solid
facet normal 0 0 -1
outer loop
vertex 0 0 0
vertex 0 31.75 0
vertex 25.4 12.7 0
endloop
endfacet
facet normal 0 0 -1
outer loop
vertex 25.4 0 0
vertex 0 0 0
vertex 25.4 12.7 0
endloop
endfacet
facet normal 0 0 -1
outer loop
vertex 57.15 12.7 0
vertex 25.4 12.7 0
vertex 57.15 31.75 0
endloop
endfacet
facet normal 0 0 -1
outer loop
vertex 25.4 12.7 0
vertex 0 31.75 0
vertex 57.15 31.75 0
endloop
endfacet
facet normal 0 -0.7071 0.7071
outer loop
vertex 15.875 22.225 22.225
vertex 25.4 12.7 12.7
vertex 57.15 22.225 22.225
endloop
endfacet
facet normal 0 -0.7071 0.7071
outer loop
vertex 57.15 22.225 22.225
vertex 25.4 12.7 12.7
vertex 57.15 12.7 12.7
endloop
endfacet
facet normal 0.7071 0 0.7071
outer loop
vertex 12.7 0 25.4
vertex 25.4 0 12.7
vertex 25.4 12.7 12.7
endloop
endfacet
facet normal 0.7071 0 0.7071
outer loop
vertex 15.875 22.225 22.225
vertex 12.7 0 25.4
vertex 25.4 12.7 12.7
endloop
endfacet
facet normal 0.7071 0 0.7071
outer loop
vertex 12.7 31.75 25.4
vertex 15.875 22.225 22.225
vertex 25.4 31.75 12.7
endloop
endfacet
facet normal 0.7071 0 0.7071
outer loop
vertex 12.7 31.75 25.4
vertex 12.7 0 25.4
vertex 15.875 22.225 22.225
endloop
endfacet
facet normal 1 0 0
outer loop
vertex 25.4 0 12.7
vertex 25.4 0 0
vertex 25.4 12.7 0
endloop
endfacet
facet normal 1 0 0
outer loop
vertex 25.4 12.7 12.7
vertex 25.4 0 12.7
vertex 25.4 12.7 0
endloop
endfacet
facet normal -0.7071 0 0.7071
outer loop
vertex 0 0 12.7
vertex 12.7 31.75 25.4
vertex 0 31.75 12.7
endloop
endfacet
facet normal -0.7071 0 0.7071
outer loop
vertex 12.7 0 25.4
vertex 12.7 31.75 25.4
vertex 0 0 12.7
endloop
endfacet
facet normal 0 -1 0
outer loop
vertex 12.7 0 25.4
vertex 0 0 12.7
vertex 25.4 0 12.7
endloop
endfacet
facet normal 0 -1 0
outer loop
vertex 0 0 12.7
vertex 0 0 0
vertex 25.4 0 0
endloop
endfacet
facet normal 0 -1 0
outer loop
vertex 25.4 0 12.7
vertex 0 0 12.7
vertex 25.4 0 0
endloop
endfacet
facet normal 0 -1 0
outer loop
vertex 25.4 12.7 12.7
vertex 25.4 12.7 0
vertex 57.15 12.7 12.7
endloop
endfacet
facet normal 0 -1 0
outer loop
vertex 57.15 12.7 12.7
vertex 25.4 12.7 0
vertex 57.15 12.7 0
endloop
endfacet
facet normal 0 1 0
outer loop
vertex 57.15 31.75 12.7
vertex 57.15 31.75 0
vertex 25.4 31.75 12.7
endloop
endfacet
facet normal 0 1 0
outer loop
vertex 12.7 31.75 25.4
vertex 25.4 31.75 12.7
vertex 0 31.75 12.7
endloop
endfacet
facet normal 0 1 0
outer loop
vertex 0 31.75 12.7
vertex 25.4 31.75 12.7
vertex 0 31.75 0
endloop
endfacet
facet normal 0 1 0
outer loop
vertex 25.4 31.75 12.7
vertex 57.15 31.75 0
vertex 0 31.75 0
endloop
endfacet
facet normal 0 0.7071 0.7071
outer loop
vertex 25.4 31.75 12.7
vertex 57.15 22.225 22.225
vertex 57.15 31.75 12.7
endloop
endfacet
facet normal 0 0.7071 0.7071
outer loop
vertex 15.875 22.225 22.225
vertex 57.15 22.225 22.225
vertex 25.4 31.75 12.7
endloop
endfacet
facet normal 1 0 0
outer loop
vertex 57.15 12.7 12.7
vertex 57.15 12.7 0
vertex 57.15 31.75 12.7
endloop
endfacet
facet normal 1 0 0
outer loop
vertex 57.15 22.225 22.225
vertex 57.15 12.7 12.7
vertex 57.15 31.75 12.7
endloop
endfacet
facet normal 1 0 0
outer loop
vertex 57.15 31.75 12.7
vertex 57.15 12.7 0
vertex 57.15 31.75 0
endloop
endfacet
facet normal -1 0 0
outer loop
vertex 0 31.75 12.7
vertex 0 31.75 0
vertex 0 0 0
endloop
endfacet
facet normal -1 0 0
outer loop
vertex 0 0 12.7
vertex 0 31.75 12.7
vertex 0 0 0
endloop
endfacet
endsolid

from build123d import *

# Parameters (mm, degrees)
F1_DEPTH = 25.4
F0_W     = 31.75
F0_H     = 19.05
F2_DEPTH = 22.225
F3_SIZE  = 12.69999
F4_SIZE  = 9.52499


# Not quite as in the source:
# - a fillet or chamfer is up to 0.001 mm smaller than in the source, because OpenCascade refuses the exact size


with BuildPart() as f1:
    # F0 (on Top) → F1 (new body)
    with BuildSketch(Plane.XY):
        Polygon((0, 31.75), (0, 0), (25.4, 0), (25.4, 12.7), (25.4, 31.75), align=None)
    extrude(amount=F1_DEPTH)

    # F0 (on Top) → F2 (join)
    with BuildSketch(Plane.XY):
        Polygon((0, 31.75), (0, 0), (25.4, 0), (25.4, 12.7), (25.4, 31.75), align=None)
        with Locations((41.275, 22.225)):
            Rectangle(F0_W, F0_H)
    extrude(amount=F2_DEPTH)

    # F3 (size 12.7 in the source; OpenCascade refuses exactly that, so slightly less here)
    f3_edges = [f1.edges().sort_by_distance(p)[0] for p in [
        (25.4, 15.875, 25.4),
        (0, 15.875, 25.4),
    ]]
    chamfer(f3_edges, length=F3_SIZE)

    # F4 (size 9.525 in the source; OpenCascade refuses exactly that, so slightly less here)
    f4_edges = [f1.edges().sort_by_distance(p)[0] for p in [
        (36.512505, 12.7, 22.225),
        (36.512505, 31.75, 22.225),
    ]]
    chamfer(f4_edges, length=F4_SIZE)


solid = f1.part
